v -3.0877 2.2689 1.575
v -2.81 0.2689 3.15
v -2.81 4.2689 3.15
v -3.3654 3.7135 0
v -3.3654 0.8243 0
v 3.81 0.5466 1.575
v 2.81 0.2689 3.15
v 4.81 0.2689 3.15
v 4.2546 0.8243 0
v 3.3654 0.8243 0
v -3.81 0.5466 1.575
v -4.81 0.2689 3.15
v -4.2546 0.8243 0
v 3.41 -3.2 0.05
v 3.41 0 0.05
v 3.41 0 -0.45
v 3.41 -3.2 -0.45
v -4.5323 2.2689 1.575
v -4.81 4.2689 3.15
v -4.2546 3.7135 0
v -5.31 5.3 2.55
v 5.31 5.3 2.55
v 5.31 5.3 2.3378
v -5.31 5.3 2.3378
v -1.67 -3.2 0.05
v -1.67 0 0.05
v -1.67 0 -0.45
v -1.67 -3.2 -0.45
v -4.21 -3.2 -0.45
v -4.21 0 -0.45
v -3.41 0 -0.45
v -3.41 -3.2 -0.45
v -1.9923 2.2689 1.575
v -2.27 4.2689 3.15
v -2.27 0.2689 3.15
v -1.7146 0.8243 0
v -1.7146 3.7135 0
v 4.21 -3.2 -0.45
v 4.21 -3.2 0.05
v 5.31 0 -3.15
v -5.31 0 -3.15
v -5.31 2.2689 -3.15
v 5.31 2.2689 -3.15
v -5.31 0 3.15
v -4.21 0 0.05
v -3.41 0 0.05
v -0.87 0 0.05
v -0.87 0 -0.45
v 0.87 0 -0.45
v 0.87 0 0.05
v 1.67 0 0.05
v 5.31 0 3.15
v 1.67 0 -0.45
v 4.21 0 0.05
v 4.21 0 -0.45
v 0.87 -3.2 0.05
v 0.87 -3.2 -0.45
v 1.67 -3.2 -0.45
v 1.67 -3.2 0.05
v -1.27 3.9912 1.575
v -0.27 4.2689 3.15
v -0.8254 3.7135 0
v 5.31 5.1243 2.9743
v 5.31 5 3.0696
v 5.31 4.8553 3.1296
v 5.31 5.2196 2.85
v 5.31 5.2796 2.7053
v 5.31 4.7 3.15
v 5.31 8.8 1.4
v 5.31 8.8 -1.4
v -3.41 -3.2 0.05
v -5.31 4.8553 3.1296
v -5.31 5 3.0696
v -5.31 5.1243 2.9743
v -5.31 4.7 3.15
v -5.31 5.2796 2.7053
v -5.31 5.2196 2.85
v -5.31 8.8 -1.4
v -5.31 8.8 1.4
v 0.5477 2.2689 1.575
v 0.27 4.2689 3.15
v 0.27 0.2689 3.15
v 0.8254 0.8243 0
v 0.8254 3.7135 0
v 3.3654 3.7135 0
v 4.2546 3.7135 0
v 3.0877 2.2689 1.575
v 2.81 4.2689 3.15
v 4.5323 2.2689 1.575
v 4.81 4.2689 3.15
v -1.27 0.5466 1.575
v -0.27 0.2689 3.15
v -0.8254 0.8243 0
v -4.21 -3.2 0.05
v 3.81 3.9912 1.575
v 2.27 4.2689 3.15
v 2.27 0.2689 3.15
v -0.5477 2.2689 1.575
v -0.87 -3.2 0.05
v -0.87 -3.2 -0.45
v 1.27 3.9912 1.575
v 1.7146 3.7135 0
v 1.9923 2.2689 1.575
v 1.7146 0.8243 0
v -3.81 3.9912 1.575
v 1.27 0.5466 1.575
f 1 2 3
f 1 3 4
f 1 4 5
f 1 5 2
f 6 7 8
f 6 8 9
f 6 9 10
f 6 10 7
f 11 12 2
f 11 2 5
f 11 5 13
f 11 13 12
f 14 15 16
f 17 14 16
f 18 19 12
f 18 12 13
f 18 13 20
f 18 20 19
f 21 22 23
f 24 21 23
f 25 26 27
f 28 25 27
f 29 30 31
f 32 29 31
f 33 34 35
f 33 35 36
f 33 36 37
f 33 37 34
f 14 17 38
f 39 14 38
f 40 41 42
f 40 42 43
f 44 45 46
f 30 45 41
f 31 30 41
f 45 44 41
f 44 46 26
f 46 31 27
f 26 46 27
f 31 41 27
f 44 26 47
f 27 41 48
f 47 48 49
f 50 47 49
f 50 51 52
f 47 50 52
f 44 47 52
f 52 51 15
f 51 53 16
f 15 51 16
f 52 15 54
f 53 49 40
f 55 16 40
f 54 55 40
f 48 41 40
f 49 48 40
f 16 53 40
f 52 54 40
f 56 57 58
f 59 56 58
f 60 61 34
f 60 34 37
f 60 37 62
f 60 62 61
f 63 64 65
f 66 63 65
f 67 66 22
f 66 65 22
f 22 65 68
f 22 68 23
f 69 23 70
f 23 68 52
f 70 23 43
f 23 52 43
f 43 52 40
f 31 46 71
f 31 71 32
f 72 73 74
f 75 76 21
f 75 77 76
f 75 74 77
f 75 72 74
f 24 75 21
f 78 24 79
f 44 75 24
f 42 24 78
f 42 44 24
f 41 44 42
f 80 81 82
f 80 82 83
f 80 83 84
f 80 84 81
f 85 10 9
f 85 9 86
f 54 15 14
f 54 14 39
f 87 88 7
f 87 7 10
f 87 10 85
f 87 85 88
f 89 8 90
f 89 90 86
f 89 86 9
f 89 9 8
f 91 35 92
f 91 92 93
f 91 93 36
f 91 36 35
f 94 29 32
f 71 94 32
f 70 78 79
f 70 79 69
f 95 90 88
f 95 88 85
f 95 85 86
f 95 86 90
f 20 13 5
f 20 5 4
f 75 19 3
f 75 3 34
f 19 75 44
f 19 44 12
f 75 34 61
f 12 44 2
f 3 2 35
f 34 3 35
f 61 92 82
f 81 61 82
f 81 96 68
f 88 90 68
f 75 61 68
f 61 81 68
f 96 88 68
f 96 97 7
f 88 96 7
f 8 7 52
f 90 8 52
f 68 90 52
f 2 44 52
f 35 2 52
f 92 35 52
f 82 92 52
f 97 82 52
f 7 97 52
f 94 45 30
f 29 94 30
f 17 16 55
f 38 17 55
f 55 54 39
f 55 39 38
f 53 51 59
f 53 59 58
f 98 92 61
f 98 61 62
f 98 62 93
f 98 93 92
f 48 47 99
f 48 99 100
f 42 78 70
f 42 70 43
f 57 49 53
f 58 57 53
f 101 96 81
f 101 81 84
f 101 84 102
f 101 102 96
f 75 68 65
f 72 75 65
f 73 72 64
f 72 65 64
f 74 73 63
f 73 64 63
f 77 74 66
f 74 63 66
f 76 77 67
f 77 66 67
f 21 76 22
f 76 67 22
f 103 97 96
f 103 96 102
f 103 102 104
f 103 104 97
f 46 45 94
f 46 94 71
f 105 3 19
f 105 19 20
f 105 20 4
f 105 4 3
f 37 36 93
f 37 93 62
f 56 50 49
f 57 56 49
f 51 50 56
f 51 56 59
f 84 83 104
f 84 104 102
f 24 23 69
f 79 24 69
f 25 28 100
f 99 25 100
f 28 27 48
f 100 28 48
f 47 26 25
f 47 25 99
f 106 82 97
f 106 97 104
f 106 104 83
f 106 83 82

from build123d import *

# Parameters (mm, degrees)
SKETCH1_W           = 10.62
SKETCH1_H           = 6.3
BOSS_EXTRUDE1_DEPTH = 8.8
SKETCH2_W           = 0.8
SKETCH2_H           = 0.5
BOSS_EXTRUDE2_DEPTH = 3.2
CUT_EXTRUDE1_REACH  = 12.62
SKETCH4_W           = 2
SKETCH4_H           = 4
CUT_EXTRUDE2_DEPTH  = 3.15
CUT_EXTRUDE2_TAPER  = 10


with BuildPart() as part:
    # Sketch1 → Boss-Extrude1 (new body)
    with BuildSketch(Plane(origin=(0, 0, 0), x_dir=(1, 0, 0), z_dir=(0, 1, 0))):
        Rectangle(SKETCH1_W, SKETCH1_H)
    extrude(amount=BOSS_EXTRUDE1_DEPTH)

    # Sketch2 → Boss-Extrude2 (add)
    with BuildSketch(Plane(origin=(0, 0, 0), x_dir=(1, 0, 0), z_dir=(0, 1, 0))):
        with Locations((1.27, 0.2)):
            Rectangle(SKETCH2_W, SKETCH2_H)
        with Locations((3.81, 0.2)):
            Rectangle(SKETCH2_W, SKETCH2_H)
        with Locations((-1.27, 0.2)):
            Rectangle(SKETCH2_W, SKETCH2_H)
        with Locations((-3.81, 0.2)):
            Rectangle(SKETCH2_W, SKETCH2_H)
    extrude(amount=-BOSS_EXTRUDE2_DEPTH)

    # Sketch3 → Cut-Extrude1 (cut, up to next)
    with BuildSketch(Plane(origin=(5.31, 0, 0), x_dir=(0, 0, -1), z_dir=(1, 0, 0)), mode=Mode.PRIVATE) as cut_extrude1_sk1:
        with BuildLine():
            ThreePointArc((-3.15, 4.7), (-2.974264069, 5.124264069), (-2.55, 5.3))
            Line((-2.55, 5.3), (-2.337822174, 5.3))
            Line((-2.337822174, 5.3), (-1.4, 8.8))
            Line((-1.4, 8.8), (-3.15, 8.8))
            Line((-3.15, 8.8), (-3.15, 4.7))
        make_face()
    cut_extrude1_tool1 = extrude(cut_extrude1_sk1.sketch, amount=-CUT_EXTRUDE1_REACH, mode=Mode.PRIVATE) & part.part
    add(cut_extrude1_tool1.solids().sort_by_distance((5.31, 7.227986, 2.489914))[0], mode=Mode.SUBTRACT)
    # Sketch3 → Cut-Extrude1 (cut, up to next)
    with BuildSketch(Plane(origin=(5.31, 0, 0), x_dir=(0, 0, -1), z_dir=(1, 0, 0)), mode=Mode.PRIVATE) as cut_extrude1_sk2:
        Polygon((3.15, 8.8), (1.4, 8.8), (3.15, 2.268911087), align=None)
    cut_extrude1_tool2 = extrude(cut_extrude1_sk2.sketch, amount=-CUT_EXTRUDE1_REACH, mode=Mode.PRIVATE) & part.part
    add(cut_extrude1_tool2.solids().sort_by_distance((5.31, 6.62297, -2.566667))[0], mode=Mode.SUBTRACT)

    # Sketch4 → Cut-Extrude2 (cut)
    with BuildSketch(Plane.XY.offset(3.15)):
        with Locations((-3.81, 2.268911087)):
            Rectangle(SKETCH4_W, SKETCH4_H)
        with Locations((-1.27, 2.268911087)):
            Rectangle(SKETCH4_W, SKETCH4_H)
        with Locations((1.27, 2.268911087)):
            Rectangle(SKETCH4_W, SKETCH4_H)
        with Locations((3.81, 2.268911087)):
            Rectangle(SKETCH4_W, SKETCH4_H)
    extrude(amount=-CUT_EXTRUDE2_DEPTH, taper=CUT_EXTRUDE2_TAPER, mode=Mode.SUBTRACT)


solid = part.part
